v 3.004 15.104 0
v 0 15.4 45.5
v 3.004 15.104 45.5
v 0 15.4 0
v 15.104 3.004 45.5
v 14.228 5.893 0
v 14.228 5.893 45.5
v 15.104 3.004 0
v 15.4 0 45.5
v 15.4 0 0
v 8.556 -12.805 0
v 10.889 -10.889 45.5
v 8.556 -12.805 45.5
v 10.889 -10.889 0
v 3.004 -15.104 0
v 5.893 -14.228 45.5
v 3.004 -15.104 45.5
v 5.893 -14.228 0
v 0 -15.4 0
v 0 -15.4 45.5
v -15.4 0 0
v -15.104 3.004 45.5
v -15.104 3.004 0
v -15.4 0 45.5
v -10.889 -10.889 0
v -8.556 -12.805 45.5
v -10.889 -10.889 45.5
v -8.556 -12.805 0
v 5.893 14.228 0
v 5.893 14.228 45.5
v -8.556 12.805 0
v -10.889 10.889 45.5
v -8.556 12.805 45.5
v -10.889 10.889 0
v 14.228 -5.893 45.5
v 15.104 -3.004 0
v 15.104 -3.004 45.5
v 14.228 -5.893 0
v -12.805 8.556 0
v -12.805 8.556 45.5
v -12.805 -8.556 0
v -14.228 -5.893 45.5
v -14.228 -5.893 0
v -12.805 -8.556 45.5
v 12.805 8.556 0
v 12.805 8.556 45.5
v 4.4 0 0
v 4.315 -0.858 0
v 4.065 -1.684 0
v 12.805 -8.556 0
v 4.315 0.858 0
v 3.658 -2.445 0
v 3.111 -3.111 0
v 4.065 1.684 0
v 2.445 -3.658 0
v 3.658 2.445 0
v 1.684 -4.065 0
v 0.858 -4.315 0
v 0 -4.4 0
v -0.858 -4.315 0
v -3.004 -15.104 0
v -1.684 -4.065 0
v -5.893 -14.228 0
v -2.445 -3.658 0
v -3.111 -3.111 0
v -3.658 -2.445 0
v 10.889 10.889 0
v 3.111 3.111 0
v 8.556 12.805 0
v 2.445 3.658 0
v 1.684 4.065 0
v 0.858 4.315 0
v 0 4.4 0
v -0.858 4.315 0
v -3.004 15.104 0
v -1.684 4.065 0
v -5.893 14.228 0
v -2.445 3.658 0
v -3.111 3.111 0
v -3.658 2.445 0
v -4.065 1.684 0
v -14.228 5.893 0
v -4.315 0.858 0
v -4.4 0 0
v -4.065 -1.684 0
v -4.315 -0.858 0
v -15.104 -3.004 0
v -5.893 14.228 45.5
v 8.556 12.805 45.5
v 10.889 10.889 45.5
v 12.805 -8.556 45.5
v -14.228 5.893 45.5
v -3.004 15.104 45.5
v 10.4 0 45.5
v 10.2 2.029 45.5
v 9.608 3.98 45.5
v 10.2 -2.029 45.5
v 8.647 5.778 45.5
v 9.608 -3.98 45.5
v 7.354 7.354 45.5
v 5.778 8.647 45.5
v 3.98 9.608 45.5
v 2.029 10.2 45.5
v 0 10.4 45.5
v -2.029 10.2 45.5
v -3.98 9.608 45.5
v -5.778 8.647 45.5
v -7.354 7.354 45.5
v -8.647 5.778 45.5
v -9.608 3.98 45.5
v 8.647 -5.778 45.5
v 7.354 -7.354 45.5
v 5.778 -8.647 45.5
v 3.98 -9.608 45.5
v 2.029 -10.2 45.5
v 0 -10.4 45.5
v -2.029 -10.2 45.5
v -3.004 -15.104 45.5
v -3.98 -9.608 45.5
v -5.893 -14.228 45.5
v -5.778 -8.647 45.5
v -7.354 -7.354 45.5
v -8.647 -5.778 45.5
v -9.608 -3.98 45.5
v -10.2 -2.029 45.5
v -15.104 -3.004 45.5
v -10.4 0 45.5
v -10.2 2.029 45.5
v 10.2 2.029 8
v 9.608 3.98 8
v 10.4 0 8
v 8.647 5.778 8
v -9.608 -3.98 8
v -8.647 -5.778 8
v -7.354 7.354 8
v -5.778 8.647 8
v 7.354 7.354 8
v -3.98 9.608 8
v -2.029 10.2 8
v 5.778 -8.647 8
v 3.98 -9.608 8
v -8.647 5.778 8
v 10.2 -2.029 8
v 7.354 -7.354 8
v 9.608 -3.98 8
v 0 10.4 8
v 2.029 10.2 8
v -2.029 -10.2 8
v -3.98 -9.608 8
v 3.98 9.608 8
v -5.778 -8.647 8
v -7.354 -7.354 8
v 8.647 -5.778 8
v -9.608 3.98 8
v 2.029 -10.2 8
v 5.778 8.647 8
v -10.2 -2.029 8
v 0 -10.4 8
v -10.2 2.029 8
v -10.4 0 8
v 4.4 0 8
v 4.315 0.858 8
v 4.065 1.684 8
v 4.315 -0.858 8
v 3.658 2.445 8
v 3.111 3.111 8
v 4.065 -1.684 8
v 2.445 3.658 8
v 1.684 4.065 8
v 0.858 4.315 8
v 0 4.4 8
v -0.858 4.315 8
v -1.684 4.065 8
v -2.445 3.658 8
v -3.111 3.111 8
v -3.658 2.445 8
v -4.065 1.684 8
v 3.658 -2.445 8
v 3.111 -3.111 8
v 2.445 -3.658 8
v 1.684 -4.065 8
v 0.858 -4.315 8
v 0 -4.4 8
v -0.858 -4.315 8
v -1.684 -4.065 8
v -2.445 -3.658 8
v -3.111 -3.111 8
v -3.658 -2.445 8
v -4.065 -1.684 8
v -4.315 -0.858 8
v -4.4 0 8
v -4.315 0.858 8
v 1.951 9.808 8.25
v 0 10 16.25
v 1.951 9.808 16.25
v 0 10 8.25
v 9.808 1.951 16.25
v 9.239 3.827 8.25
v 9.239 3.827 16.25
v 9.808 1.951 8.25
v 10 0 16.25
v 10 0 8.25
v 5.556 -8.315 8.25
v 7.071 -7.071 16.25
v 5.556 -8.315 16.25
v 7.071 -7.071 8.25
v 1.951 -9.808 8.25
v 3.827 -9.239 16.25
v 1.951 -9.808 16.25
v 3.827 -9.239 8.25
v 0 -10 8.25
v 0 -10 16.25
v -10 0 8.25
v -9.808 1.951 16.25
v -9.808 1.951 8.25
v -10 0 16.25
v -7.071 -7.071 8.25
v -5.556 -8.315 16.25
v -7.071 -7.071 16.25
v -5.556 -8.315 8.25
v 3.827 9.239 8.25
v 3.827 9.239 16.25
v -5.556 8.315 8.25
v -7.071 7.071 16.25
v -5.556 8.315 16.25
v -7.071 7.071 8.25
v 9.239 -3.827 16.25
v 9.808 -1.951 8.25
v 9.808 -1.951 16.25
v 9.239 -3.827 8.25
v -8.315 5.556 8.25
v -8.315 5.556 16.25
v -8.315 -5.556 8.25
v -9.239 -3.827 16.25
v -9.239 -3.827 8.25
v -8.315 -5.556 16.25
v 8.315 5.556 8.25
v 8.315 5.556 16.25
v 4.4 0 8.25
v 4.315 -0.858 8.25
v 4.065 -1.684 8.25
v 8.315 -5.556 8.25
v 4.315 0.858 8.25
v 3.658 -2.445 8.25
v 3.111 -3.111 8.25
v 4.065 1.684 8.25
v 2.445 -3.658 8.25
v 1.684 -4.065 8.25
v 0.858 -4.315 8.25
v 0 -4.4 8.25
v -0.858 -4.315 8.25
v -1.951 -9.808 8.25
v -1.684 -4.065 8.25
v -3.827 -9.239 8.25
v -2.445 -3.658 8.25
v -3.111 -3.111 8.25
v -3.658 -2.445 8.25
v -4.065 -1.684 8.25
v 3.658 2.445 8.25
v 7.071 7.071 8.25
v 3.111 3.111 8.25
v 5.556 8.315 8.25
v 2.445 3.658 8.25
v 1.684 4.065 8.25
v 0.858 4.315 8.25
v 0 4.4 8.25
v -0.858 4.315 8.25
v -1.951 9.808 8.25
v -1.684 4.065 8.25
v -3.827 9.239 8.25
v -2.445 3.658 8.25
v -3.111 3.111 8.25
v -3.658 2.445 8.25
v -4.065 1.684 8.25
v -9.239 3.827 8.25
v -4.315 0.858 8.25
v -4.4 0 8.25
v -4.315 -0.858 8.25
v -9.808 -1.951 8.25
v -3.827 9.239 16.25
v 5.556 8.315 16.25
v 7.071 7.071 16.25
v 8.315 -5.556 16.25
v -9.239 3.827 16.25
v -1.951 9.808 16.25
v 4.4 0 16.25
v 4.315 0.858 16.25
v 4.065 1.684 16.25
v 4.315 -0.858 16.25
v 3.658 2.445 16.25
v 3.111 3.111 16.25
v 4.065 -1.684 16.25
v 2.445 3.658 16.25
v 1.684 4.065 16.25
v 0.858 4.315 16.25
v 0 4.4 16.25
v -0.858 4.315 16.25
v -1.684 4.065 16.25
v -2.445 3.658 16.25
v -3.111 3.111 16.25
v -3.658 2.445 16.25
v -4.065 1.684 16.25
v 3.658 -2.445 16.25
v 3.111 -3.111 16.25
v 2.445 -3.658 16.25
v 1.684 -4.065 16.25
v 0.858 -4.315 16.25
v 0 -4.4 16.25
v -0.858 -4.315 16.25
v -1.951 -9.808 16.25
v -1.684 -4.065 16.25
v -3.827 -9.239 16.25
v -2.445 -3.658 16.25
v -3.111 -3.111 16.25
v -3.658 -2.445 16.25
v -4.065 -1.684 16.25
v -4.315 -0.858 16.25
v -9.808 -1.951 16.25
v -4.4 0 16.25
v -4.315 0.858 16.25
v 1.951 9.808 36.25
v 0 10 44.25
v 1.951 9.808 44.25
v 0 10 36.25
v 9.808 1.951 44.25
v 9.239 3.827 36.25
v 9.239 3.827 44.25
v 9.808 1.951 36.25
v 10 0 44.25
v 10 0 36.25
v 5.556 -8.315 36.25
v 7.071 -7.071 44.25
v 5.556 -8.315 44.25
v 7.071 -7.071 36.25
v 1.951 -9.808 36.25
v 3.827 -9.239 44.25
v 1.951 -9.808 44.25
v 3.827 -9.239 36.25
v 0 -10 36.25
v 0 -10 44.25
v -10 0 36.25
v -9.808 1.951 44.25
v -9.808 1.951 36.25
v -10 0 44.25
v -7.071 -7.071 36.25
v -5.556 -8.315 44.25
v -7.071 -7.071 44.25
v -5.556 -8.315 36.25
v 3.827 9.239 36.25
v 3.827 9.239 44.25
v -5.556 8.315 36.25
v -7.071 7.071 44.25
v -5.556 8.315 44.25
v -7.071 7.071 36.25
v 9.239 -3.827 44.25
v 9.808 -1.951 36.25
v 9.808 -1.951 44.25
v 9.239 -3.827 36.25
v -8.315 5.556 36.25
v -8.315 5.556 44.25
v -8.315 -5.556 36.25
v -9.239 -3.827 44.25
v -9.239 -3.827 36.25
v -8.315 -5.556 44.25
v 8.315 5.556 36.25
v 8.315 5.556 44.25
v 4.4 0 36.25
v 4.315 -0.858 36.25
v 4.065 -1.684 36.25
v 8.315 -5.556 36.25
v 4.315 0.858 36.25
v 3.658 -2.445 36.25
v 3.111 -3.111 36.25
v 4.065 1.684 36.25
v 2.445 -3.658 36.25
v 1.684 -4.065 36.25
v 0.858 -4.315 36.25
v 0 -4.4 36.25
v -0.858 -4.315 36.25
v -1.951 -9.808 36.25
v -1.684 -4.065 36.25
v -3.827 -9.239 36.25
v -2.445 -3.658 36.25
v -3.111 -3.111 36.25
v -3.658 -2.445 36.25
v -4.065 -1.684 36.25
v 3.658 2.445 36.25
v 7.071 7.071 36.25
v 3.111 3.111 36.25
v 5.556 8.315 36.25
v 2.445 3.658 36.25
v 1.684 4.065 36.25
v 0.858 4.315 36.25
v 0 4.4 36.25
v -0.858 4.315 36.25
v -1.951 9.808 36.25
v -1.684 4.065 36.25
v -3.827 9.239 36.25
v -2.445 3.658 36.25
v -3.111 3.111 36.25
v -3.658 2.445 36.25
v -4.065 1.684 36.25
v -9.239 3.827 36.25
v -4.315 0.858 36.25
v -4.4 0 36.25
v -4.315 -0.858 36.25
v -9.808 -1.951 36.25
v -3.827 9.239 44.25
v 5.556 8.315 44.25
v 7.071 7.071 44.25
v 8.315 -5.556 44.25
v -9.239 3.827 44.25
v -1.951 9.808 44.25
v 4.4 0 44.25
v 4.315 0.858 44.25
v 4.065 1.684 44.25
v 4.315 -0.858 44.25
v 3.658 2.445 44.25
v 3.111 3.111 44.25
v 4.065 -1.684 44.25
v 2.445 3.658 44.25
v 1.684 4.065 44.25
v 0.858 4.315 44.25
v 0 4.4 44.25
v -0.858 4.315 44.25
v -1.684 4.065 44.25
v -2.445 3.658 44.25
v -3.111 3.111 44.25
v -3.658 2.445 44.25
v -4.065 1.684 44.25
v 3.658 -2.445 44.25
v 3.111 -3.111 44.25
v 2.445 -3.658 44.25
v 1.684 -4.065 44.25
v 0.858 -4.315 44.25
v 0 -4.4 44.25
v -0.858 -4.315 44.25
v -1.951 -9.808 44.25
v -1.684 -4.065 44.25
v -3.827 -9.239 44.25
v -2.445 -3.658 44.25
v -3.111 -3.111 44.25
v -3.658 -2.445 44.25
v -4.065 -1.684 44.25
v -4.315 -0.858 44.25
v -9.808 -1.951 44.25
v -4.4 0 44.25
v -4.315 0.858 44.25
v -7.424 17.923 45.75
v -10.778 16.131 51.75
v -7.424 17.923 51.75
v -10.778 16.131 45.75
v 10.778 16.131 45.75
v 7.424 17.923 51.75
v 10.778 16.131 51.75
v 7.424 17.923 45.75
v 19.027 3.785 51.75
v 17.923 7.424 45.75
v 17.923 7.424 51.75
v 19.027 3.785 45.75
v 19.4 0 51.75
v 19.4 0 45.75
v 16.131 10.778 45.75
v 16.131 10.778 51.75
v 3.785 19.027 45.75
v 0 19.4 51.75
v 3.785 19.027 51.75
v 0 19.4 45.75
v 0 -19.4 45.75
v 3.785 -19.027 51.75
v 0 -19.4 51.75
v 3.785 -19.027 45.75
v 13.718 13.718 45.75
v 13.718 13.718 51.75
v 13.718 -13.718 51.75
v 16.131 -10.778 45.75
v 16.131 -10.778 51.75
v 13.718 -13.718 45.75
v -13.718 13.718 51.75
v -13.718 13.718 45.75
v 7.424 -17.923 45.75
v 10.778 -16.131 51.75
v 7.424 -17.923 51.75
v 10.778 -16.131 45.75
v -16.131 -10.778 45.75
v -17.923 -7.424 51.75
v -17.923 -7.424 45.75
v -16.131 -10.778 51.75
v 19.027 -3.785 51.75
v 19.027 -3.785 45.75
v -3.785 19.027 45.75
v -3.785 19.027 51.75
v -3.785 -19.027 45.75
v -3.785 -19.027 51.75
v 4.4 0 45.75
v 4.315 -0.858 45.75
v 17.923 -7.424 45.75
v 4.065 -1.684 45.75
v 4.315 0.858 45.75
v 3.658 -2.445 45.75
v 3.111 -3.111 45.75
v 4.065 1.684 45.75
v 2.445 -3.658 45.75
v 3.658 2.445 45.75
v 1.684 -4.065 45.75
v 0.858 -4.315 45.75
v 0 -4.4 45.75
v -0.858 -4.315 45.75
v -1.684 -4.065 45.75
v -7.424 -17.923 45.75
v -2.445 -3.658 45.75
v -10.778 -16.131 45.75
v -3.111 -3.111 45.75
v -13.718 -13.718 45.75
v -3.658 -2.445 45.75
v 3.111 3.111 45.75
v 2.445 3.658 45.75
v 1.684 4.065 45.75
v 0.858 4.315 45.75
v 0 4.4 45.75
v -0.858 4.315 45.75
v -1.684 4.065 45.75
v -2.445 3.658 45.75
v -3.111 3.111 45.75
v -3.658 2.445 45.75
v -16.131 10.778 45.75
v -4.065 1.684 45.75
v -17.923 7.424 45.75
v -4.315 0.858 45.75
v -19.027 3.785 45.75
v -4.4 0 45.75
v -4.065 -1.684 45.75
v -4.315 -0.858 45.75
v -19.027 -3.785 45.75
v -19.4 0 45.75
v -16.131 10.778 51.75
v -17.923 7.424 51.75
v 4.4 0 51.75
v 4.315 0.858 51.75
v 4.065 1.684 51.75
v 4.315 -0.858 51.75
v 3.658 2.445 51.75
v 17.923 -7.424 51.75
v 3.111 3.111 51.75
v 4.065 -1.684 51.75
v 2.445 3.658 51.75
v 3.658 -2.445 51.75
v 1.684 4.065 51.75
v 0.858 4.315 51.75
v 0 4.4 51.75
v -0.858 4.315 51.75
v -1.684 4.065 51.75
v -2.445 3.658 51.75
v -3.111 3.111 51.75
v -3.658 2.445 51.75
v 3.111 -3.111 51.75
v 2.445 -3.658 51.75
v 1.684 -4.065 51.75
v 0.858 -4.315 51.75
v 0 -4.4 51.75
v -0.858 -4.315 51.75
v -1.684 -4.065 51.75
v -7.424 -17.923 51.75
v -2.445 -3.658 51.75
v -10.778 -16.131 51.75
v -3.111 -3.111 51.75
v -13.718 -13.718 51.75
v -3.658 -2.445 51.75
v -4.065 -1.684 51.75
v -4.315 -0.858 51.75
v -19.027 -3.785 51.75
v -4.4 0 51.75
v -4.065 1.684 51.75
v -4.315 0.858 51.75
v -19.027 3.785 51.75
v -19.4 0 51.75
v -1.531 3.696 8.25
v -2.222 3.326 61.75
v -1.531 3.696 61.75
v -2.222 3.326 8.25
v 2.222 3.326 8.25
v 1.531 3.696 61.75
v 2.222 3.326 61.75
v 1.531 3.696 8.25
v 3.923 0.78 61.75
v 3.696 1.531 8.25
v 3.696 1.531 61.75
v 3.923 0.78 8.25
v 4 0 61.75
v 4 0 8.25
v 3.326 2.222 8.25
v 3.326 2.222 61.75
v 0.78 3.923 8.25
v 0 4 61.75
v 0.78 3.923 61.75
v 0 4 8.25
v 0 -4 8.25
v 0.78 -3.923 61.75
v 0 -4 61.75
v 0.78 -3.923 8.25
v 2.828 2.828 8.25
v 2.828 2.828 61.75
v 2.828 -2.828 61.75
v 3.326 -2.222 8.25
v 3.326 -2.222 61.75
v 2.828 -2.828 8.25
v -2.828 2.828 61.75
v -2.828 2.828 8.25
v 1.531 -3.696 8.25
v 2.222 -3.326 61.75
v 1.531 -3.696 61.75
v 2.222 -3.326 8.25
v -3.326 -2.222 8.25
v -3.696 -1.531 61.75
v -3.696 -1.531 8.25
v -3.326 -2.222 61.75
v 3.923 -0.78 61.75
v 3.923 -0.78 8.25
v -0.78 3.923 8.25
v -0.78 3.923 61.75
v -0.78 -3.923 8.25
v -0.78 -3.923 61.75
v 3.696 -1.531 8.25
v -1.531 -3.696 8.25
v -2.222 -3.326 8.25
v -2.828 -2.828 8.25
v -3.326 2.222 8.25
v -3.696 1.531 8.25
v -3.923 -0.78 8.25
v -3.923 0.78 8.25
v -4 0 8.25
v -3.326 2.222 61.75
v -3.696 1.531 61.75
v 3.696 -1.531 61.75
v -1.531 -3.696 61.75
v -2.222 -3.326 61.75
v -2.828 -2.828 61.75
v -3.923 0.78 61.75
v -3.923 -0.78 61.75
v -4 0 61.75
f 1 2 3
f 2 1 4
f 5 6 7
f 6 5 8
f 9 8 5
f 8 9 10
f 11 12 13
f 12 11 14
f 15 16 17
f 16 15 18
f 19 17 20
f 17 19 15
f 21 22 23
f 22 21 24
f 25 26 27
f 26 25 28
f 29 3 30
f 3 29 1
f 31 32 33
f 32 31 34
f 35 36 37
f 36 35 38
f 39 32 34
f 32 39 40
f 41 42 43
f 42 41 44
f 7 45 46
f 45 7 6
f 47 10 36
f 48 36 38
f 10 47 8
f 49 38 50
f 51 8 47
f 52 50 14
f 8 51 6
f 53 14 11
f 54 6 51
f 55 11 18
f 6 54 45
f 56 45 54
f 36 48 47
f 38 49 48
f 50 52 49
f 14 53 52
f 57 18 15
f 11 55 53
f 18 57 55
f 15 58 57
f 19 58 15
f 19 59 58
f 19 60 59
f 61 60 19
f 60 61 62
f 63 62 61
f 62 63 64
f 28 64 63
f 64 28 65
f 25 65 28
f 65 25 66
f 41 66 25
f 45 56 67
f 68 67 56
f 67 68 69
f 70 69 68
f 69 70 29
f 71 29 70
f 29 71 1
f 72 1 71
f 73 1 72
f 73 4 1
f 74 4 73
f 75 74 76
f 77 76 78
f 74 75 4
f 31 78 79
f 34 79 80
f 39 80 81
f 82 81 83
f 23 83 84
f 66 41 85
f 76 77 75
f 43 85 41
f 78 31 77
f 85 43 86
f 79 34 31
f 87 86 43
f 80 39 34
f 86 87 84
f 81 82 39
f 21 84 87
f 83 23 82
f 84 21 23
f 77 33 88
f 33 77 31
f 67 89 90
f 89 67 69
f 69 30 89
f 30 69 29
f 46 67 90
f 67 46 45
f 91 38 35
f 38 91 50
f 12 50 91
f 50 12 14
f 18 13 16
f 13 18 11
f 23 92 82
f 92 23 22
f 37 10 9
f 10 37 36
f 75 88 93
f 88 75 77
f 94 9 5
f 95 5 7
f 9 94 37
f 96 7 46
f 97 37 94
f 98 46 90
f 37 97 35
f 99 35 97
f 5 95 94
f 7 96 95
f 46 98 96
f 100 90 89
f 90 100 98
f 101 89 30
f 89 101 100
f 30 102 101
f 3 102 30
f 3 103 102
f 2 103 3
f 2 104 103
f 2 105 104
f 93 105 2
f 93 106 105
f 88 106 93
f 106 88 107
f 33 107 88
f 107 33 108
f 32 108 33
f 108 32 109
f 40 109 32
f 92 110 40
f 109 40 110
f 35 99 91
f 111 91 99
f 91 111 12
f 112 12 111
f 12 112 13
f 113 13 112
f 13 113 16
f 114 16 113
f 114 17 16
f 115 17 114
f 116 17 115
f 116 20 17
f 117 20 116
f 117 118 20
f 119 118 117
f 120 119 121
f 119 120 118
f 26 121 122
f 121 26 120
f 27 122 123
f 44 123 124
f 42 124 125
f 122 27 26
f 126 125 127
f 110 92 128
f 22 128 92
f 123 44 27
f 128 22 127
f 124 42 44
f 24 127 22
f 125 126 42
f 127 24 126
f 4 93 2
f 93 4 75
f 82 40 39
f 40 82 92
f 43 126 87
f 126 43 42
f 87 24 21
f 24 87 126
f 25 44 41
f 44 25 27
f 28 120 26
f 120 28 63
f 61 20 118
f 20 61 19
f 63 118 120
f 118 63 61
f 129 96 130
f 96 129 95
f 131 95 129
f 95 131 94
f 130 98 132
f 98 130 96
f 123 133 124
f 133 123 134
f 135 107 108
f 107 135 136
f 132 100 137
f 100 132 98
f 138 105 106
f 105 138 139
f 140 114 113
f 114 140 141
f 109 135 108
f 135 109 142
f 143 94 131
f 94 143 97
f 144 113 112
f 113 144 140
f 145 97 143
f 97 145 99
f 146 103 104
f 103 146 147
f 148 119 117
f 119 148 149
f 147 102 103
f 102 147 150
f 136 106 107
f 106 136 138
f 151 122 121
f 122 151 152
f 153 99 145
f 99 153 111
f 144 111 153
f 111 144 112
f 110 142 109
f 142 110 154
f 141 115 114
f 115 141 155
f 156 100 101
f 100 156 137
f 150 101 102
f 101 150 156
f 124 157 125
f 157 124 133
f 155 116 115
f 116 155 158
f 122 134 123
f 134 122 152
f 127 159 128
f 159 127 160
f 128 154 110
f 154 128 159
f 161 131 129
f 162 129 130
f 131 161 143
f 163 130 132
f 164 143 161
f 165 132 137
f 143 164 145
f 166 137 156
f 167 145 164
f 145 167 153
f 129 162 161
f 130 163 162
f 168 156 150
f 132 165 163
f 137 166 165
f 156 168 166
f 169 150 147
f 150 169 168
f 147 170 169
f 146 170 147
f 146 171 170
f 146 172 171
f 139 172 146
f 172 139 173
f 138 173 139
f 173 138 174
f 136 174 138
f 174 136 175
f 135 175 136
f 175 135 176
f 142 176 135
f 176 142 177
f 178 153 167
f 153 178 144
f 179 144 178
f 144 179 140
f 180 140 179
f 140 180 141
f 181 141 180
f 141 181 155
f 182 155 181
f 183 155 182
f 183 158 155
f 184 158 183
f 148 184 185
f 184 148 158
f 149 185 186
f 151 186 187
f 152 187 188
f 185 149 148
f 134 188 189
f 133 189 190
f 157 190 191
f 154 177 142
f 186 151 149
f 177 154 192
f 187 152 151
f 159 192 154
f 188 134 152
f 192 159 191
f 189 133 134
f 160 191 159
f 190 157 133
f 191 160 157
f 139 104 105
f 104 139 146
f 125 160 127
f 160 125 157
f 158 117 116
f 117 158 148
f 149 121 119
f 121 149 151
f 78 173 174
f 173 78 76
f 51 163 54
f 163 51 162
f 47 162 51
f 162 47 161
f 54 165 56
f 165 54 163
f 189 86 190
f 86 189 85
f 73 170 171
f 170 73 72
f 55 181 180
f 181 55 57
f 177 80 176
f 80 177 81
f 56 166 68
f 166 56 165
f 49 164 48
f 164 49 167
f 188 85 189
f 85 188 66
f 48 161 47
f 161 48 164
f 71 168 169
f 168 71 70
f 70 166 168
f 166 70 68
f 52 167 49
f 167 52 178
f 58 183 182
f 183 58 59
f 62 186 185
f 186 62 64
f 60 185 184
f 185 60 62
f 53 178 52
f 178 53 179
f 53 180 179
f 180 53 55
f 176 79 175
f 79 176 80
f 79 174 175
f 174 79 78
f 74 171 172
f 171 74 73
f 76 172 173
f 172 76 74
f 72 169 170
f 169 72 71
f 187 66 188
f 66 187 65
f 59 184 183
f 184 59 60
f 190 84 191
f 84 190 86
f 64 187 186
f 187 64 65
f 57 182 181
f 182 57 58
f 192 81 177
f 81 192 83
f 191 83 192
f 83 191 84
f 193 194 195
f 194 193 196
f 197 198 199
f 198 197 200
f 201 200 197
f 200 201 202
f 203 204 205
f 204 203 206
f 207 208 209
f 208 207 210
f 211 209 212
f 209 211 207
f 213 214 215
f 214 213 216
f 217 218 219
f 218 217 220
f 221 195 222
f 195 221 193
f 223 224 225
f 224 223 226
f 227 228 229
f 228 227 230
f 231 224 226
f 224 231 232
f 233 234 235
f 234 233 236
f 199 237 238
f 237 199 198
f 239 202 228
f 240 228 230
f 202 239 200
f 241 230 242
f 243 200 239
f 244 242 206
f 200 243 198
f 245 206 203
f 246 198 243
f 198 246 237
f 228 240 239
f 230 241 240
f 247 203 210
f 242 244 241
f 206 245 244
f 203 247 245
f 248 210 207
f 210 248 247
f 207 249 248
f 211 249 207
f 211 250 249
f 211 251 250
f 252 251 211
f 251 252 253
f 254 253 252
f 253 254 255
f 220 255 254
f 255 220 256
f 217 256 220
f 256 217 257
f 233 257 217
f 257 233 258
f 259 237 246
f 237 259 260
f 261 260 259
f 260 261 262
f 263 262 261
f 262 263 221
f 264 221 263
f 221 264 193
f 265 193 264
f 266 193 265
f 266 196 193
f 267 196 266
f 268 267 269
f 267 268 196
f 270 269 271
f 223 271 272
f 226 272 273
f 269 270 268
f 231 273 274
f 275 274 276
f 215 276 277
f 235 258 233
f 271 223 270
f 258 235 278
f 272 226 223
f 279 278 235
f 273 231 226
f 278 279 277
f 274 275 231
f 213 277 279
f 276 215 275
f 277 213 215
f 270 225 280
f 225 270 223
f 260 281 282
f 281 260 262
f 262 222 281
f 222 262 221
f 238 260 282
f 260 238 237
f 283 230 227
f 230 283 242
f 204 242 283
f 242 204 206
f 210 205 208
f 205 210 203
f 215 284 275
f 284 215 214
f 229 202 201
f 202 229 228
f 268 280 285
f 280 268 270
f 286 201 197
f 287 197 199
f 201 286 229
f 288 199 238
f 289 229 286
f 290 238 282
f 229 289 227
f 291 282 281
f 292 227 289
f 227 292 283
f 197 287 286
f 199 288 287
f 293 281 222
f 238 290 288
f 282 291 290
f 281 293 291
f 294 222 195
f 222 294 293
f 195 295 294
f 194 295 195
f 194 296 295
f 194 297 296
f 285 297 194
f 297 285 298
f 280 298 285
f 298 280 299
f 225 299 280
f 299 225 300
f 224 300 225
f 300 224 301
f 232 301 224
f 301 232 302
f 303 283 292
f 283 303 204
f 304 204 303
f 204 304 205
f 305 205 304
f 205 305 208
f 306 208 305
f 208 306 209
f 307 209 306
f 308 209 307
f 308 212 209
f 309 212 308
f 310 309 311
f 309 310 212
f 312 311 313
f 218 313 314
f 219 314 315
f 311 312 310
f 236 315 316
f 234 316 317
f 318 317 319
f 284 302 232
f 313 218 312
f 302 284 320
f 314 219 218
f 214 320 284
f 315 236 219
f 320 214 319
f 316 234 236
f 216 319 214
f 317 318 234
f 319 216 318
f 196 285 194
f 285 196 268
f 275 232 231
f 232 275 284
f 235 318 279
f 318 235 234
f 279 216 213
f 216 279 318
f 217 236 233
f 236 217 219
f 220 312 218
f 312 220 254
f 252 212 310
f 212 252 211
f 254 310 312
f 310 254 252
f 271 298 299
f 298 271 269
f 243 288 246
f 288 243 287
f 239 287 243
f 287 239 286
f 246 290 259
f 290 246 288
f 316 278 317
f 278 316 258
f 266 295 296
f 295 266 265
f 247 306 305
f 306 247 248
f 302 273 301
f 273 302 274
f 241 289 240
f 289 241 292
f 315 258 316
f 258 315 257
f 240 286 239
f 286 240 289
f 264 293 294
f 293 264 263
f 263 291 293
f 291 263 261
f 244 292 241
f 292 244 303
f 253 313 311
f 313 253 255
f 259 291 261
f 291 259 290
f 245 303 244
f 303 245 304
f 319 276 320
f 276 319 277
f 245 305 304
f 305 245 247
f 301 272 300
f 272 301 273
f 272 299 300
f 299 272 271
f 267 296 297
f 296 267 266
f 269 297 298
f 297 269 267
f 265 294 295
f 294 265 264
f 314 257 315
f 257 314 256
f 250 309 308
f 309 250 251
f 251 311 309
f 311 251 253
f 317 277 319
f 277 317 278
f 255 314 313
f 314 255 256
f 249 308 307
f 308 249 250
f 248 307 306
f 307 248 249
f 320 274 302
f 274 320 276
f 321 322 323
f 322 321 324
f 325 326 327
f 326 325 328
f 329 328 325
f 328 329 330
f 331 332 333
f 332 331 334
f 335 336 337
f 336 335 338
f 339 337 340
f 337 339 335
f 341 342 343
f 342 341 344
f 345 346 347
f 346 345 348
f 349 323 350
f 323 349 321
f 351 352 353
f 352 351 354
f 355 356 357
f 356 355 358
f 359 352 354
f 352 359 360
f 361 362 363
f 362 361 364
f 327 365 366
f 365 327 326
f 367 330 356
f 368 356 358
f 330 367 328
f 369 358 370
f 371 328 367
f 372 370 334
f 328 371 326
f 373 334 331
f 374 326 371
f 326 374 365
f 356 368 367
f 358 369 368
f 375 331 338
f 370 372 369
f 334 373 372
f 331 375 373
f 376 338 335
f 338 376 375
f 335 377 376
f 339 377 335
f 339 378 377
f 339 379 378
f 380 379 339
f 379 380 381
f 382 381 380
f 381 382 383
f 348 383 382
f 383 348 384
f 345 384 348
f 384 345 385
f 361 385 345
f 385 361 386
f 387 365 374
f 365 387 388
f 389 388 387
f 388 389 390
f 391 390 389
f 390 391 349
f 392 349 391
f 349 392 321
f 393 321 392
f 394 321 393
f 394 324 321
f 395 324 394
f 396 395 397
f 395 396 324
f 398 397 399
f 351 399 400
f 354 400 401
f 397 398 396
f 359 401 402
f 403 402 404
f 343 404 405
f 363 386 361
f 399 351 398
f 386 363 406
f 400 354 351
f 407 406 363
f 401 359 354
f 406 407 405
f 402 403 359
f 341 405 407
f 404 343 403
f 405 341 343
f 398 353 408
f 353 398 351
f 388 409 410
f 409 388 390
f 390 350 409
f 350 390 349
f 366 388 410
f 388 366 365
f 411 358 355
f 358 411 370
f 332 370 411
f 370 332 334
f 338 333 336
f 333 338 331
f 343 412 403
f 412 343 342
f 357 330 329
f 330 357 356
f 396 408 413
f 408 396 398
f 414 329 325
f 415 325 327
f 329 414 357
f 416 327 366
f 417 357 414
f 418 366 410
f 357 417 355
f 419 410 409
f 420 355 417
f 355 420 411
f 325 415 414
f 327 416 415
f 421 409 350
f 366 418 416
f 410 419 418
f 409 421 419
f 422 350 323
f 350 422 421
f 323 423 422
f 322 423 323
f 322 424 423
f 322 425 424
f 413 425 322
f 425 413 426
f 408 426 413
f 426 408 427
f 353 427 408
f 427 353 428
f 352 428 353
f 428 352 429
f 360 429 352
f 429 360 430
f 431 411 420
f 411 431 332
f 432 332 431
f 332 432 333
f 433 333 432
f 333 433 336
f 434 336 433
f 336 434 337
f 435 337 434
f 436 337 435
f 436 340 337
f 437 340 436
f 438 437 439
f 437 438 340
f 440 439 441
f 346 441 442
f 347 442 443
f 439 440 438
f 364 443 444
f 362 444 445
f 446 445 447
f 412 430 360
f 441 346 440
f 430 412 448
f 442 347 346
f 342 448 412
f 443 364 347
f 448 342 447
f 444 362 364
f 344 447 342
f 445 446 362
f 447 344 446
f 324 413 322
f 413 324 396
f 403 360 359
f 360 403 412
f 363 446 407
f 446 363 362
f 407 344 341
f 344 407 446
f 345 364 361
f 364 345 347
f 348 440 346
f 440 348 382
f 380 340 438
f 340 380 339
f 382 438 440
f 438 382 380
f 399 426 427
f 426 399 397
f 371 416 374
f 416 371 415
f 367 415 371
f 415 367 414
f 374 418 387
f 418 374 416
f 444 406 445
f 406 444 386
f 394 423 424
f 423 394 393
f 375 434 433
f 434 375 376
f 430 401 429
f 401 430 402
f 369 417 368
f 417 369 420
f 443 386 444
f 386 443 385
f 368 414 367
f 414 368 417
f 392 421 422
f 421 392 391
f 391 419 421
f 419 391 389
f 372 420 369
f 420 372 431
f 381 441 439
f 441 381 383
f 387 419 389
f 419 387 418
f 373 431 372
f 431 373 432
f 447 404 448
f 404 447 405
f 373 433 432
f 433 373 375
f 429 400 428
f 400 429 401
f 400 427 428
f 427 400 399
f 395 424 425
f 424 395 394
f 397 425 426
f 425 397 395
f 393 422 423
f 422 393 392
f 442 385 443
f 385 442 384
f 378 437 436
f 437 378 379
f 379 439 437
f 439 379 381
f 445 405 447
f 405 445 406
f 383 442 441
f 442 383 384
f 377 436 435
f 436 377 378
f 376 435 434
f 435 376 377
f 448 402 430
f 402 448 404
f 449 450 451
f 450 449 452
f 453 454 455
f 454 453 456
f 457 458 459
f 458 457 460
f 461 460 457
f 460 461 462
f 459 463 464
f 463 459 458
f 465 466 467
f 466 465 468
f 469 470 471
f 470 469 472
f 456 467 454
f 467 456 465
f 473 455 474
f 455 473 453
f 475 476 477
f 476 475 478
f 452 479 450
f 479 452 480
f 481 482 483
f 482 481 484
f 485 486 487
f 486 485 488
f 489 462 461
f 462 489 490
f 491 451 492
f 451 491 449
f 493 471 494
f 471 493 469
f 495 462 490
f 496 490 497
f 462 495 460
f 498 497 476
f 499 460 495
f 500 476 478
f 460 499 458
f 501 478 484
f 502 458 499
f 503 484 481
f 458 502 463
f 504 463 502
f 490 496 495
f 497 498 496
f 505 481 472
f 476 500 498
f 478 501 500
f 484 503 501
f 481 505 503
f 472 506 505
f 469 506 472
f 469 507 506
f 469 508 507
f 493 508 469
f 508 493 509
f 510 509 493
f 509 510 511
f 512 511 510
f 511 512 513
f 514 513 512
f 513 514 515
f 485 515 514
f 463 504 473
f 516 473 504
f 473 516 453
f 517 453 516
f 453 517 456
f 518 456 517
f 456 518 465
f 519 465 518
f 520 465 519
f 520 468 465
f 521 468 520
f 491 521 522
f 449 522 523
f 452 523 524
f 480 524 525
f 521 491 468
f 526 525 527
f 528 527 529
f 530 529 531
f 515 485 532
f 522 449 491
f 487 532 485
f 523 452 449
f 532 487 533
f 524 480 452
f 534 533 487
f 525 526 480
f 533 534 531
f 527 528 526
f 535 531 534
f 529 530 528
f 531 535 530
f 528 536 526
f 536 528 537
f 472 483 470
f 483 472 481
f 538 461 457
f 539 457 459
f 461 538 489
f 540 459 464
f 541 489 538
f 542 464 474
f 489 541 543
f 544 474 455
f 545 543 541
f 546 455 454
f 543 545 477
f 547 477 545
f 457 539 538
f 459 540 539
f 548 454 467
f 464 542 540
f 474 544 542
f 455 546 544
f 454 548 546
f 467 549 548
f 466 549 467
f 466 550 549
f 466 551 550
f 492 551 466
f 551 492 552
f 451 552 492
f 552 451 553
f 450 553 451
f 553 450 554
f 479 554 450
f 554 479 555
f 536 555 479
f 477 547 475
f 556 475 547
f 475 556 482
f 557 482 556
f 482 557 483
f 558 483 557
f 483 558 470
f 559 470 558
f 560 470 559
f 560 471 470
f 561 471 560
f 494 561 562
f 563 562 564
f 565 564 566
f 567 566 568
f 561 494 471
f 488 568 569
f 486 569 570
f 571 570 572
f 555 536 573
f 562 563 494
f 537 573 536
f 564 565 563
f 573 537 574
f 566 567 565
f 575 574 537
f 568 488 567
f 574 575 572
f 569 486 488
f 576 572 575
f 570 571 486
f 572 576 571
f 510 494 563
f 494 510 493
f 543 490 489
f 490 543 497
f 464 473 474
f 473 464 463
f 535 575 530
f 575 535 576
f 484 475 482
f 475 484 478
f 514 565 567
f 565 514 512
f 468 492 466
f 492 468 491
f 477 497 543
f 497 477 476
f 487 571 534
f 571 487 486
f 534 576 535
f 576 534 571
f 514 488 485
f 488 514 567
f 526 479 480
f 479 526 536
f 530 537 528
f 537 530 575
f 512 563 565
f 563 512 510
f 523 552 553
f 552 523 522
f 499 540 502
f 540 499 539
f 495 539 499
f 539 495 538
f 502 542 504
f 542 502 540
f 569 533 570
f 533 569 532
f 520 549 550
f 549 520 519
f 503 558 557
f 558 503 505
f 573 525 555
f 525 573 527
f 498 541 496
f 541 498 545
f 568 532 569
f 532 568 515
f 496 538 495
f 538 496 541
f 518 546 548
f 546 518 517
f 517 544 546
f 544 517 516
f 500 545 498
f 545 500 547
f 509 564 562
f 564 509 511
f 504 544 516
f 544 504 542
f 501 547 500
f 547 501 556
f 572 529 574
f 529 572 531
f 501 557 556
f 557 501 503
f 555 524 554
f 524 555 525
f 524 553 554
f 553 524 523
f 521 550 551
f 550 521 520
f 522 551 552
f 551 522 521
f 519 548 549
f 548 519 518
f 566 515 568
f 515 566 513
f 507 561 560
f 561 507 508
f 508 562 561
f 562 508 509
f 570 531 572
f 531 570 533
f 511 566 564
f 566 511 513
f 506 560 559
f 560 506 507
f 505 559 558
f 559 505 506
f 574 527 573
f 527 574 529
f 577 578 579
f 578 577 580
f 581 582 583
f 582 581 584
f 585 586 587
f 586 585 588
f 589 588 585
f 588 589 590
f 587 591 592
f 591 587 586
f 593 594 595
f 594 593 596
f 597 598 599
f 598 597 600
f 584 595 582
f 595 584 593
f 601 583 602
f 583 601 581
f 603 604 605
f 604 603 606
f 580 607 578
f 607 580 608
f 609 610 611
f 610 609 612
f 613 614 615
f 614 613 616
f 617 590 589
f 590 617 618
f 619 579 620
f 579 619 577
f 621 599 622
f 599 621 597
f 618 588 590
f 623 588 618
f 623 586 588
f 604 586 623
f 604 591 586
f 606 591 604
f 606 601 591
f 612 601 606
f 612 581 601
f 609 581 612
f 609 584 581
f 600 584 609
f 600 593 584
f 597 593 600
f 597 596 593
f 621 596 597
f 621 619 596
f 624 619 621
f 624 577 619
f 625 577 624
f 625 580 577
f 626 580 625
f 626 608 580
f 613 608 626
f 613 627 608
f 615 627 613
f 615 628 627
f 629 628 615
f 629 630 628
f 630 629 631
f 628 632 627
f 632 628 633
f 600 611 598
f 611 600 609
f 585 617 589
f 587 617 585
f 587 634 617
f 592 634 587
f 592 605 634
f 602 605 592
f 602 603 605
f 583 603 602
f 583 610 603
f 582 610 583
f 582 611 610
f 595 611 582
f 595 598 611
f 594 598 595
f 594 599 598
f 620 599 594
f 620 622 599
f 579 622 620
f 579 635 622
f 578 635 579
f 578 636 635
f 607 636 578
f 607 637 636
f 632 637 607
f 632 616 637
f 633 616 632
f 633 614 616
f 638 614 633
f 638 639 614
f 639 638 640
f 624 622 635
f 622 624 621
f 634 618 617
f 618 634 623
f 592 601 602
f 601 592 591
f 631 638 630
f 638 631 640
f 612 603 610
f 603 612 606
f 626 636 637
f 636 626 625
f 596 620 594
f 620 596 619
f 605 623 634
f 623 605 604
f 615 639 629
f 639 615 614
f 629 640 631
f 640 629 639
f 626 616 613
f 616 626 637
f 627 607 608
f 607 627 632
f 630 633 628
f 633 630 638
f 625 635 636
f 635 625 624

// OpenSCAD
$fn = 32;

// ------------------------------------------------------------------------
// Shaft station: cup d30.8 x 45.5 mm, shaft d8
// Every part is its own module, assembly() places every instance.
// ------------------------------------------------------------------------

// --- part 1 ---
module housing_cup() {
  difference() {
    cylinder(h = 45.5, d = 30.8);
    translate([0, 0, 8]) cylinder(h = 38.5, d = 20.8);
    translate([0, 0, -1]) cylinder(h = 10, d = 8.8);
  }
}

// --- part 2 ---
module bearing_lower() {
  difference() {
      translate([0, 0, 0]) cylinder(h = 8, d = 20);
      translate([0, 0, -1]) cylinder(h = 10, d = 8.8);
    }
}

// --- part 3 ---
module bearing_upper() {
  difference() {
      translate([0, 0, 0]) cylinder(h = 8, d = 20);
      translate([0, 0, -1]) cylinder(h = 10, d = 8.8);
    }
}

// --- part 4 ---
module station_shaft() {
  translate([0, 0, -26.75]) cylinder(h = 53.5, d = 8);
}

// --- part 5 ---
module station_cover() {
  difference() {
    cylinder(h = 6, d = 38.8);
    translate([0, 0, -1]) cylinder(h = 8, d = 8.8);
  }
}

// --- assembly ---
module assembly() {
  color([0.80, 0.24, 0.20]) translate([0, 0, 0]) rotate([0, 0, 0]) housing_cup();
  color([0.20, 0.45, 0.75]) translate([0, 0, 8.25]) rotate([0, 0, 0]) bearing_lower();
  color([0.25, 0.62, 0.32]) translate([0, 0, 36.25]) rotate([0, 0, 0]) bearing_upper();
  color([0.92, 0.70, 0.18]) translate([0, 0, 35]) rotate([0, 0, 0]) station_shaft();
  color([0.58, 0.35, 0.70]) translate([0, 0, 45.75]) rotate([0, 0, 0]) station_cover();
}

assembly();
